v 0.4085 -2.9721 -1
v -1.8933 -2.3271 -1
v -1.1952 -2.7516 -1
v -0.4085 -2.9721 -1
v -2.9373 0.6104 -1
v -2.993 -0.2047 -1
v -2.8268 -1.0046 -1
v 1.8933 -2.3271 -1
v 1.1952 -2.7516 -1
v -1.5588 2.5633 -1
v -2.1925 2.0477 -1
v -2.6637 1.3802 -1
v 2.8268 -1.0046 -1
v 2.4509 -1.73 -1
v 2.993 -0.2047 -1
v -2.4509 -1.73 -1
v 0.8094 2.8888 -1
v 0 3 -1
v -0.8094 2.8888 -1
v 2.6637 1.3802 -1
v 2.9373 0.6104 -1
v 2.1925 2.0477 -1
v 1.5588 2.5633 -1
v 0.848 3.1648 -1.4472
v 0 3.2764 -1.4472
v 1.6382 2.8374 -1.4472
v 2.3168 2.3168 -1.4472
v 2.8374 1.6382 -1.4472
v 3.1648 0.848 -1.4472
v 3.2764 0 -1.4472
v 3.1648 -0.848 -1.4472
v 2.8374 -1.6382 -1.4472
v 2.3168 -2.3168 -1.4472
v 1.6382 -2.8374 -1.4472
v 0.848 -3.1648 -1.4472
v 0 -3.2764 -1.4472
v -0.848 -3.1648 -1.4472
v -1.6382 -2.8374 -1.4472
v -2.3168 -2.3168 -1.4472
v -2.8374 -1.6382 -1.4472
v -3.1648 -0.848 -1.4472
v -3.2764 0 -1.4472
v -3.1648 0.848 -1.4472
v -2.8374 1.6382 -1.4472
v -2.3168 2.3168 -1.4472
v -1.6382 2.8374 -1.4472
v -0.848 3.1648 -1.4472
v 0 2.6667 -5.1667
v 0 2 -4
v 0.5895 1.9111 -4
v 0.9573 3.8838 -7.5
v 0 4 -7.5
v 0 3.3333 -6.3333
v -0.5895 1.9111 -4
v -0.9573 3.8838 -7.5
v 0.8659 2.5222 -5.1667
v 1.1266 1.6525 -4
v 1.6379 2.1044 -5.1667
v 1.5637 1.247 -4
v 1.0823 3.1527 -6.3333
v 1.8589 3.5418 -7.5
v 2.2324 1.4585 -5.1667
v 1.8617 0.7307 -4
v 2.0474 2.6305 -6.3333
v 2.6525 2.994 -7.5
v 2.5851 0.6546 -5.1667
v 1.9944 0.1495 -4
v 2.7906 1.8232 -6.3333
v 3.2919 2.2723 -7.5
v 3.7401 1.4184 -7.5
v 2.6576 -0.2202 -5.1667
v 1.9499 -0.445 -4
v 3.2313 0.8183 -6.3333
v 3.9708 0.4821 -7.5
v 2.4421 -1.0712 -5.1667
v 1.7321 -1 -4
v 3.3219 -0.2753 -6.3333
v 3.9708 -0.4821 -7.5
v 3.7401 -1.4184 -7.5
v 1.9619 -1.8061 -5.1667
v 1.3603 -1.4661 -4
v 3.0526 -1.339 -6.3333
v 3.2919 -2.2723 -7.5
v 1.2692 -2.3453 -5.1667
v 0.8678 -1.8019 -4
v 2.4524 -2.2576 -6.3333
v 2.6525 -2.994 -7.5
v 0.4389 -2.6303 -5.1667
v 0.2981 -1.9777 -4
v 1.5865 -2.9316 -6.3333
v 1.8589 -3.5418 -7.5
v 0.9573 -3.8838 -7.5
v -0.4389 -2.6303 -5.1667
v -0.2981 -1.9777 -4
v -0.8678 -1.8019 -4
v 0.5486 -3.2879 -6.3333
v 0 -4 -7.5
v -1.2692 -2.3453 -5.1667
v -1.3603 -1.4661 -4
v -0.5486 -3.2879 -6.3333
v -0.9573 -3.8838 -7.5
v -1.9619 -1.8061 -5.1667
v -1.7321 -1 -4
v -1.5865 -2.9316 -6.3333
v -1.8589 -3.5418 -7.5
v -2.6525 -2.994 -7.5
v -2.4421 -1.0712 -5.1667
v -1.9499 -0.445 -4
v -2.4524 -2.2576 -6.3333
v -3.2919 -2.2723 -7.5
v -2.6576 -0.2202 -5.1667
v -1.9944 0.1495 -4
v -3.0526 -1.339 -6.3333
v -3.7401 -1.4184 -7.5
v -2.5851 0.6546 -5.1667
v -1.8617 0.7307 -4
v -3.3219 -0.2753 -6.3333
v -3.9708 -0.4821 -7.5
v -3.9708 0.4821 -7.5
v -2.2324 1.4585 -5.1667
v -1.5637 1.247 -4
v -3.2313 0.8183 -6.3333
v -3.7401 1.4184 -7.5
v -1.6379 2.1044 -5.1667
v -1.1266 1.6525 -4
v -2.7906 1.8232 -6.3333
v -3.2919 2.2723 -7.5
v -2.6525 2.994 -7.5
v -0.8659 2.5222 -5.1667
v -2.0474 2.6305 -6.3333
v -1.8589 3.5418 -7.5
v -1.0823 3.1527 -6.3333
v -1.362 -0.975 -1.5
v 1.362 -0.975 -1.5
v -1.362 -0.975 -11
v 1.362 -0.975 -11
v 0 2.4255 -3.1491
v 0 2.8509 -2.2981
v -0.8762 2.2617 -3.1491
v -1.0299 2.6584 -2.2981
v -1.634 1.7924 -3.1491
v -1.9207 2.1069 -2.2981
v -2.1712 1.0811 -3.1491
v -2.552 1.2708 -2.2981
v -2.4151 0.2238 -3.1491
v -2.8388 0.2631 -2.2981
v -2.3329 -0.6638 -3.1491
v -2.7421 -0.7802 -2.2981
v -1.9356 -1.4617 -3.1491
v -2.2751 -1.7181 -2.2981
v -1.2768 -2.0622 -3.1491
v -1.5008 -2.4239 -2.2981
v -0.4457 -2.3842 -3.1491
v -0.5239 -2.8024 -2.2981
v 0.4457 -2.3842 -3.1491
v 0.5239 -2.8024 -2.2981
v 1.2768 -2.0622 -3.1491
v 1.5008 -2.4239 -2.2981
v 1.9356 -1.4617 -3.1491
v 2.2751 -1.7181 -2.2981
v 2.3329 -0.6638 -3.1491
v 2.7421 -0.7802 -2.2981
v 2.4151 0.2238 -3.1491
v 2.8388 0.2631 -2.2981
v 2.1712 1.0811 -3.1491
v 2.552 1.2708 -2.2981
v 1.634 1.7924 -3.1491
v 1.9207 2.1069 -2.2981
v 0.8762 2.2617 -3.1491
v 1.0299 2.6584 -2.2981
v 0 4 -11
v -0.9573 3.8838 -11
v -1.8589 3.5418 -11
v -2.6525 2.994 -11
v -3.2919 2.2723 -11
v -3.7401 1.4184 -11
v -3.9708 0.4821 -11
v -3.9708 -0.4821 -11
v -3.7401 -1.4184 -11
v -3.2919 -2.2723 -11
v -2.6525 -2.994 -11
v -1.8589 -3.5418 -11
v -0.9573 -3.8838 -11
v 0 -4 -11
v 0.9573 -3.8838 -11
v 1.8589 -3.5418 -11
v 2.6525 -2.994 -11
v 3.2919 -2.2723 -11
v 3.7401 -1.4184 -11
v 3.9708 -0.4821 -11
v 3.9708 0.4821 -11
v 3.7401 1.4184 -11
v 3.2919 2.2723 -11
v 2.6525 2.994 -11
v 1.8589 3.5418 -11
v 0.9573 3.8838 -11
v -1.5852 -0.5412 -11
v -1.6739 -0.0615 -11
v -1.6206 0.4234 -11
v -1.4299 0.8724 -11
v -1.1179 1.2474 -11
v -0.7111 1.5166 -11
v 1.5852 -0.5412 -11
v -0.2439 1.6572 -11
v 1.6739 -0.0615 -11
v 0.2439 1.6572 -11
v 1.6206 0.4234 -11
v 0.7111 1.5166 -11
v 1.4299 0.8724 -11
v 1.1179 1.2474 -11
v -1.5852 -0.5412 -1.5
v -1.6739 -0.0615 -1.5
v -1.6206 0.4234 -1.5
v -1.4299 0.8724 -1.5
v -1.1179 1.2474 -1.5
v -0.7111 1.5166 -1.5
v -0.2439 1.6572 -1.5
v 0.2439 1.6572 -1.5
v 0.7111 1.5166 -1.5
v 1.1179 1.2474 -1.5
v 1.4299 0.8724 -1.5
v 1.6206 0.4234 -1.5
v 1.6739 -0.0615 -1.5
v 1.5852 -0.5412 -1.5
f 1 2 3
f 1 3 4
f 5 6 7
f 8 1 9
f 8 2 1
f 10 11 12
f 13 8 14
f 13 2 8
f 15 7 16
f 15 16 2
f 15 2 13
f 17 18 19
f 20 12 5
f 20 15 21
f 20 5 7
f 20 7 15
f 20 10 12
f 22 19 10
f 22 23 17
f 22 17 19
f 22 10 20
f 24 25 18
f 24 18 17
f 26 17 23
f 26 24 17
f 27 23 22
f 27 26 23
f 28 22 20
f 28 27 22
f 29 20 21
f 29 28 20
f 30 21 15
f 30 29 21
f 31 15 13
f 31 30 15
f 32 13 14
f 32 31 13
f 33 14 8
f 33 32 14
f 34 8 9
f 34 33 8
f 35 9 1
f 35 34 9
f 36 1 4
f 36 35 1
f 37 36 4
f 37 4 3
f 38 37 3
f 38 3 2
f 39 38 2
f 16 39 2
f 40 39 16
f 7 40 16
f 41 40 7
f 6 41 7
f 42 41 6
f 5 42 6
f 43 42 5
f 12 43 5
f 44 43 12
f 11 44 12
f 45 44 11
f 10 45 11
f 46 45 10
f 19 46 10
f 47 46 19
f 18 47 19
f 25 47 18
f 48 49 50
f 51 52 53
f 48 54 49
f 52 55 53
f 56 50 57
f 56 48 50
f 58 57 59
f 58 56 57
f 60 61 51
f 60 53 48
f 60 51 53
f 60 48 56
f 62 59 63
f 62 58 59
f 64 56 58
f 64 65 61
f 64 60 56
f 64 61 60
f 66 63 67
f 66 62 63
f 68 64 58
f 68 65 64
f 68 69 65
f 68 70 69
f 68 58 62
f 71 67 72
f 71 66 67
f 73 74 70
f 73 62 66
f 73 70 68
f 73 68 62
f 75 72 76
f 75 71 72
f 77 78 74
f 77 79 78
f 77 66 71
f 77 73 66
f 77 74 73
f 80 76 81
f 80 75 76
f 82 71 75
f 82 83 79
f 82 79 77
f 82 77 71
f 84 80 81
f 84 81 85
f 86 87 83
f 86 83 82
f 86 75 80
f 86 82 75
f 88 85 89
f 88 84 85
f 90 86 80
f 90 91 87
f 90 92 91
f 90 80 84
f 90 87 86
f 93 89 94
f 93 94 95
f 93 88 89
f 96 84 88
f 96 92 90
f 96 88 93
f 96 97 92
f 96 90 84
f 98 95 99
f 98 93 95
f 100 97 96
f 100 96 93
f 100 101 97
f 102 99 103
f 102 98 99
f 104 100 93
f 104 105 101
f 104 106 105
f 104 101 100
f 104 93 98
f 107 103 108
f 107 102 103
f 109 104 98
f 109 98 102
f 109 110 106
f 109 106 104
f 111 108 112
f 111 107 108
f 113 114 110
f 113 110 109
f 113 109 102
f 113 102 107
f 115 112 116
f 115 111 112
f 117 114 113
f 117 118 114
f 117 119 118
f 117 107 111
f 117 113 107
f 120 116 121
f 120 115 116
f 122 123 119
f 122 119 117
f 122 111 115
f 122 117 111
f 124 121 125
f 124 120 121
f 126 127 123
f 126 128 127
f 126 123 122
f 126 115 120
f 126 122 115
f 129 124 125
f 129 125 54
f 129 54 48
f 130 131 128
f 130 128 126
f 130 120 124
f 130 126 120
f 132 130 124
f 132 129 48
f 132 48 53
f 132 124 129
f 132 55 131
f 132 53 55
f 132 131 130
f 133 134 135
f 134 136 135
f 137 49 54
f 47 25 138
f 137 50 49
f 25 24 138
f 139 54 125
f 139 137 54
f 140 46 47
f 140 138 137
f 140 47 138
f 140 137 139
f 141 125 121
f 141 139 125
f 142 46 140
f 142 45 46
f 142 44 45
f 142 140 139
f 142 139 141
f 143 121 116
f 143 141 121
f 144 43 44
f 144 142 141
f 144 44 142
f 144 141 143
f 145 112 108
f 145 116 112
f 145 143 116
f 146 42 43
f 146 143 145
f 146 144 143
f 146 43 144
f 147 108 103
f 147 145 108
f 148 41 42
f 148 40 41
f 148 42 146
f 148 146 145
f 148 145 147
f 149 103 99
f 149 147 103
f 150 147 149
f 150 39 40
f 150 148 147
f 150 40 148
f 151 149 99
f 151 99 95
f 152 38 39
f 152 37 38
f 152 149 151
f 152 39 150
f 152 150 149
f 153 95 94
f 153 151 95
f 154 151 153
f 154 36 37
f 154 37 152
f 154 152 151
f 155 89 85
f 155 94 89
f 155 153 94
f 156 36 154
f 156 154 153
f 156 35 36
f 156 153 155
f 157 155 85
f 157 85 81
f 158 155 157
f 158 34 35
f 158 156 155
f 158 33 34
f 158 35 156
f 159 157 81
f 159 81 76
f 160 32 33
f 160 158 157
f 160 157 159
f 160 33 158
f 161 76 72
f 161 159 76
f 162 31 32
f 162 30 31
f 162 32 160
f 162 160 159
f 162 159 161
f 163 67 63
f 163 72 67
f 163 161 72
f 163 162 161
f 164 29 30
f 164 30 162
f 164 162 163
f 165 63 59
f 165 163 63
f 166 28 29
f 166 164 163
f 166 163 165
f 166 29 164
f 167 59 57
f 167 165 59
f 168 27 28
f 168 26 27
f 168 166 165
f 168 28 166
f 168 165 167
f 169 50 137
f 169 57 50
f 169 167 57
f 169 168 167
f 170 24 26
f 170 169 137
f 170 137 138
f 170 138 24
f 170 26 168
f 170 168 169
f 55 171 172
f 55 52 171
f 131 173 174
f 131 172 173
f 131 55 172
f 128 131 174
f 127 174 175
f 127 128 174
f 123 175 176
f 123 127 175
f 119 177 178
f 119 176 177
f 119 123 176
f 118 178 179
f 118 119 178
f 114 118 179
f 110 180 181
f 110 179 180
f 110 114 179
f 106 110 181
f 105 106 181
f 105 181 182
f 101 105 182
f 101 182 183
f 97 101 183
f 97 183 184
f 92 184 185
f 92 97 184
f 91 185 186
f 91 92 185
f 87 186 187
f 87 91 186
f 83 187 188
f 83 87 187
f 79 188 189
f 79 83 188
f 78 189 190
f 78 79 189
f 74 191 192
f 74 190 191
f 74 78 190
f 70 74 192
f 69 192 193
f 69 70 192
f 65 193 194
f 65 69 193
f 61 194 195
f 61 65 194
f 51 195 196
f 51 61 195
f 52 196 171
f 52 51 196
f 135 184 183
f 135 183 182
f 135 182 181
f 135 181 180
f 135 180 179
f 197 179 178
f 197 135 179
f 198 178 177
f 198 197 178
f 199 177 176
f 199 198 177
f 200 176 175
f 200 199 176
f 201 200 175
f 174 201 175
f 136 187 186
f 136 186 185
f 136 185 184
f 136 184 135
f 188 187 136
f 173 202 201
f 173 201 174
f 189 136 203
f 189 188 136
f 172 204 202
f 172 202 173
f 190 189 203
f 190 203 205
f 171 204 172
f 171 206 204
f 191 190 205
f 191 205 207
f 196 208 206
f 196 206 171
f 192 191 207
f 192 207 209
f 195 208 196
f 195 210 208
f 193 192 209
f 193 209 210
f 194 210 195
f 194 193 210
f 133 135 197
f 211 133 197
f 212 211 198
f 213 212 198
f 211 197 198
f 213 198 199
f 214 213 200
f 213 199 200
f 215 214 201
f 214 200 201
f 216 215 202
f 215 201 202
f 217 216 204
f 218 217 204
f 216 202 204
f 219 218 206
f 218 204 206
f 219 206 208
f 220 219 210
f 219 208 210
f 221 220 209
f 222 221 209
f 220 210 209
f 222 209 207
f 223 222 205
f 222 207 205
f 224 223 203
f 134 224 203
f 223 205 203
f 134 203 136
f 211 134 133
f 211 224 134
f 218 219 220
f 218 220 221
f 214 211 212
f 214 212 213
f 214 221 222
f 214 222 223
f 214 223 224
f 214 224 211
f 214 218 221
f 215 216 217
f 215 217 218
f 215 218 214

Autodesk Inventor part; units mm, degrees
ref_plane "YZ Plane" through (0, 0, 0) normal (1, 0, 0) x (0, 1, 0)
ref_plane "XZ Plane" through (0, 0, 0) normal (0, 1, 0) x (-1, 0, 0)
ref_plane "XY Plane" through (0, 0, 0) normal (0, 0, 1) x (1, 0, 0)
sketch "Sketch1" plane through (0, 0, 0) normal (1, 0, 0) x (0, 1, 0)
  line L0 (0, 0) -> (4, 0)
  line L1 (0, 0) -> (0, -11)
  line L2 (0, -11) -> (4, -11)
  line L3 (4, -11) -> (4, -7.5)
  line L4 (2, -4) -> (4, 0)
  line L5 (4, -7.5) -> (2, -4)
  line L6 (4, -7.5) -> (4, -7.5)
  dimension "d1" = 11
  dimension "d2" = 4
  dimension "d3" = 3.5
  dimension "d11" = 4
  dimension "d12" = 2
  dimension "d13" = 4
  dimension "d14" = 0
  dimension "d15" = 3.5
revolve "Revolution1" add sketch "Sketch1" angle 360 about axis through (0, 0, 0) along (0, 0, -1)
sketch "Sketch2" plane through (0, 0, -11) normal (0, 0, -1) x (-1, 0, 0)
  arc A0 (1.362, -0.975) -> (-1.362, -0.975) centre (0, 0) ccw
  line L0 (-1.9022, -0.975) -> (1.9927, -0.975)
  dimension "d7" = 3.35
  dimension "d8" = 2.65
extrude "Extrusion1" cut sketch "Sketch2" against normal blind 9.5
sketch "Sketch3" plane through (0, 0, 0) normal (0, 0, 1) x (1, 0, 0)
  circle A0 centre (0, 0) radius 4 projected
  point P0 (0, 0)
extrude "Extrusion2" cut sketch "Sketch3" against normal blind 1
chamfer "Chamfer1" distance 0.5 angle 45 1 edges at (0, -3.5, -1)
properties part number "drive-pulley"
